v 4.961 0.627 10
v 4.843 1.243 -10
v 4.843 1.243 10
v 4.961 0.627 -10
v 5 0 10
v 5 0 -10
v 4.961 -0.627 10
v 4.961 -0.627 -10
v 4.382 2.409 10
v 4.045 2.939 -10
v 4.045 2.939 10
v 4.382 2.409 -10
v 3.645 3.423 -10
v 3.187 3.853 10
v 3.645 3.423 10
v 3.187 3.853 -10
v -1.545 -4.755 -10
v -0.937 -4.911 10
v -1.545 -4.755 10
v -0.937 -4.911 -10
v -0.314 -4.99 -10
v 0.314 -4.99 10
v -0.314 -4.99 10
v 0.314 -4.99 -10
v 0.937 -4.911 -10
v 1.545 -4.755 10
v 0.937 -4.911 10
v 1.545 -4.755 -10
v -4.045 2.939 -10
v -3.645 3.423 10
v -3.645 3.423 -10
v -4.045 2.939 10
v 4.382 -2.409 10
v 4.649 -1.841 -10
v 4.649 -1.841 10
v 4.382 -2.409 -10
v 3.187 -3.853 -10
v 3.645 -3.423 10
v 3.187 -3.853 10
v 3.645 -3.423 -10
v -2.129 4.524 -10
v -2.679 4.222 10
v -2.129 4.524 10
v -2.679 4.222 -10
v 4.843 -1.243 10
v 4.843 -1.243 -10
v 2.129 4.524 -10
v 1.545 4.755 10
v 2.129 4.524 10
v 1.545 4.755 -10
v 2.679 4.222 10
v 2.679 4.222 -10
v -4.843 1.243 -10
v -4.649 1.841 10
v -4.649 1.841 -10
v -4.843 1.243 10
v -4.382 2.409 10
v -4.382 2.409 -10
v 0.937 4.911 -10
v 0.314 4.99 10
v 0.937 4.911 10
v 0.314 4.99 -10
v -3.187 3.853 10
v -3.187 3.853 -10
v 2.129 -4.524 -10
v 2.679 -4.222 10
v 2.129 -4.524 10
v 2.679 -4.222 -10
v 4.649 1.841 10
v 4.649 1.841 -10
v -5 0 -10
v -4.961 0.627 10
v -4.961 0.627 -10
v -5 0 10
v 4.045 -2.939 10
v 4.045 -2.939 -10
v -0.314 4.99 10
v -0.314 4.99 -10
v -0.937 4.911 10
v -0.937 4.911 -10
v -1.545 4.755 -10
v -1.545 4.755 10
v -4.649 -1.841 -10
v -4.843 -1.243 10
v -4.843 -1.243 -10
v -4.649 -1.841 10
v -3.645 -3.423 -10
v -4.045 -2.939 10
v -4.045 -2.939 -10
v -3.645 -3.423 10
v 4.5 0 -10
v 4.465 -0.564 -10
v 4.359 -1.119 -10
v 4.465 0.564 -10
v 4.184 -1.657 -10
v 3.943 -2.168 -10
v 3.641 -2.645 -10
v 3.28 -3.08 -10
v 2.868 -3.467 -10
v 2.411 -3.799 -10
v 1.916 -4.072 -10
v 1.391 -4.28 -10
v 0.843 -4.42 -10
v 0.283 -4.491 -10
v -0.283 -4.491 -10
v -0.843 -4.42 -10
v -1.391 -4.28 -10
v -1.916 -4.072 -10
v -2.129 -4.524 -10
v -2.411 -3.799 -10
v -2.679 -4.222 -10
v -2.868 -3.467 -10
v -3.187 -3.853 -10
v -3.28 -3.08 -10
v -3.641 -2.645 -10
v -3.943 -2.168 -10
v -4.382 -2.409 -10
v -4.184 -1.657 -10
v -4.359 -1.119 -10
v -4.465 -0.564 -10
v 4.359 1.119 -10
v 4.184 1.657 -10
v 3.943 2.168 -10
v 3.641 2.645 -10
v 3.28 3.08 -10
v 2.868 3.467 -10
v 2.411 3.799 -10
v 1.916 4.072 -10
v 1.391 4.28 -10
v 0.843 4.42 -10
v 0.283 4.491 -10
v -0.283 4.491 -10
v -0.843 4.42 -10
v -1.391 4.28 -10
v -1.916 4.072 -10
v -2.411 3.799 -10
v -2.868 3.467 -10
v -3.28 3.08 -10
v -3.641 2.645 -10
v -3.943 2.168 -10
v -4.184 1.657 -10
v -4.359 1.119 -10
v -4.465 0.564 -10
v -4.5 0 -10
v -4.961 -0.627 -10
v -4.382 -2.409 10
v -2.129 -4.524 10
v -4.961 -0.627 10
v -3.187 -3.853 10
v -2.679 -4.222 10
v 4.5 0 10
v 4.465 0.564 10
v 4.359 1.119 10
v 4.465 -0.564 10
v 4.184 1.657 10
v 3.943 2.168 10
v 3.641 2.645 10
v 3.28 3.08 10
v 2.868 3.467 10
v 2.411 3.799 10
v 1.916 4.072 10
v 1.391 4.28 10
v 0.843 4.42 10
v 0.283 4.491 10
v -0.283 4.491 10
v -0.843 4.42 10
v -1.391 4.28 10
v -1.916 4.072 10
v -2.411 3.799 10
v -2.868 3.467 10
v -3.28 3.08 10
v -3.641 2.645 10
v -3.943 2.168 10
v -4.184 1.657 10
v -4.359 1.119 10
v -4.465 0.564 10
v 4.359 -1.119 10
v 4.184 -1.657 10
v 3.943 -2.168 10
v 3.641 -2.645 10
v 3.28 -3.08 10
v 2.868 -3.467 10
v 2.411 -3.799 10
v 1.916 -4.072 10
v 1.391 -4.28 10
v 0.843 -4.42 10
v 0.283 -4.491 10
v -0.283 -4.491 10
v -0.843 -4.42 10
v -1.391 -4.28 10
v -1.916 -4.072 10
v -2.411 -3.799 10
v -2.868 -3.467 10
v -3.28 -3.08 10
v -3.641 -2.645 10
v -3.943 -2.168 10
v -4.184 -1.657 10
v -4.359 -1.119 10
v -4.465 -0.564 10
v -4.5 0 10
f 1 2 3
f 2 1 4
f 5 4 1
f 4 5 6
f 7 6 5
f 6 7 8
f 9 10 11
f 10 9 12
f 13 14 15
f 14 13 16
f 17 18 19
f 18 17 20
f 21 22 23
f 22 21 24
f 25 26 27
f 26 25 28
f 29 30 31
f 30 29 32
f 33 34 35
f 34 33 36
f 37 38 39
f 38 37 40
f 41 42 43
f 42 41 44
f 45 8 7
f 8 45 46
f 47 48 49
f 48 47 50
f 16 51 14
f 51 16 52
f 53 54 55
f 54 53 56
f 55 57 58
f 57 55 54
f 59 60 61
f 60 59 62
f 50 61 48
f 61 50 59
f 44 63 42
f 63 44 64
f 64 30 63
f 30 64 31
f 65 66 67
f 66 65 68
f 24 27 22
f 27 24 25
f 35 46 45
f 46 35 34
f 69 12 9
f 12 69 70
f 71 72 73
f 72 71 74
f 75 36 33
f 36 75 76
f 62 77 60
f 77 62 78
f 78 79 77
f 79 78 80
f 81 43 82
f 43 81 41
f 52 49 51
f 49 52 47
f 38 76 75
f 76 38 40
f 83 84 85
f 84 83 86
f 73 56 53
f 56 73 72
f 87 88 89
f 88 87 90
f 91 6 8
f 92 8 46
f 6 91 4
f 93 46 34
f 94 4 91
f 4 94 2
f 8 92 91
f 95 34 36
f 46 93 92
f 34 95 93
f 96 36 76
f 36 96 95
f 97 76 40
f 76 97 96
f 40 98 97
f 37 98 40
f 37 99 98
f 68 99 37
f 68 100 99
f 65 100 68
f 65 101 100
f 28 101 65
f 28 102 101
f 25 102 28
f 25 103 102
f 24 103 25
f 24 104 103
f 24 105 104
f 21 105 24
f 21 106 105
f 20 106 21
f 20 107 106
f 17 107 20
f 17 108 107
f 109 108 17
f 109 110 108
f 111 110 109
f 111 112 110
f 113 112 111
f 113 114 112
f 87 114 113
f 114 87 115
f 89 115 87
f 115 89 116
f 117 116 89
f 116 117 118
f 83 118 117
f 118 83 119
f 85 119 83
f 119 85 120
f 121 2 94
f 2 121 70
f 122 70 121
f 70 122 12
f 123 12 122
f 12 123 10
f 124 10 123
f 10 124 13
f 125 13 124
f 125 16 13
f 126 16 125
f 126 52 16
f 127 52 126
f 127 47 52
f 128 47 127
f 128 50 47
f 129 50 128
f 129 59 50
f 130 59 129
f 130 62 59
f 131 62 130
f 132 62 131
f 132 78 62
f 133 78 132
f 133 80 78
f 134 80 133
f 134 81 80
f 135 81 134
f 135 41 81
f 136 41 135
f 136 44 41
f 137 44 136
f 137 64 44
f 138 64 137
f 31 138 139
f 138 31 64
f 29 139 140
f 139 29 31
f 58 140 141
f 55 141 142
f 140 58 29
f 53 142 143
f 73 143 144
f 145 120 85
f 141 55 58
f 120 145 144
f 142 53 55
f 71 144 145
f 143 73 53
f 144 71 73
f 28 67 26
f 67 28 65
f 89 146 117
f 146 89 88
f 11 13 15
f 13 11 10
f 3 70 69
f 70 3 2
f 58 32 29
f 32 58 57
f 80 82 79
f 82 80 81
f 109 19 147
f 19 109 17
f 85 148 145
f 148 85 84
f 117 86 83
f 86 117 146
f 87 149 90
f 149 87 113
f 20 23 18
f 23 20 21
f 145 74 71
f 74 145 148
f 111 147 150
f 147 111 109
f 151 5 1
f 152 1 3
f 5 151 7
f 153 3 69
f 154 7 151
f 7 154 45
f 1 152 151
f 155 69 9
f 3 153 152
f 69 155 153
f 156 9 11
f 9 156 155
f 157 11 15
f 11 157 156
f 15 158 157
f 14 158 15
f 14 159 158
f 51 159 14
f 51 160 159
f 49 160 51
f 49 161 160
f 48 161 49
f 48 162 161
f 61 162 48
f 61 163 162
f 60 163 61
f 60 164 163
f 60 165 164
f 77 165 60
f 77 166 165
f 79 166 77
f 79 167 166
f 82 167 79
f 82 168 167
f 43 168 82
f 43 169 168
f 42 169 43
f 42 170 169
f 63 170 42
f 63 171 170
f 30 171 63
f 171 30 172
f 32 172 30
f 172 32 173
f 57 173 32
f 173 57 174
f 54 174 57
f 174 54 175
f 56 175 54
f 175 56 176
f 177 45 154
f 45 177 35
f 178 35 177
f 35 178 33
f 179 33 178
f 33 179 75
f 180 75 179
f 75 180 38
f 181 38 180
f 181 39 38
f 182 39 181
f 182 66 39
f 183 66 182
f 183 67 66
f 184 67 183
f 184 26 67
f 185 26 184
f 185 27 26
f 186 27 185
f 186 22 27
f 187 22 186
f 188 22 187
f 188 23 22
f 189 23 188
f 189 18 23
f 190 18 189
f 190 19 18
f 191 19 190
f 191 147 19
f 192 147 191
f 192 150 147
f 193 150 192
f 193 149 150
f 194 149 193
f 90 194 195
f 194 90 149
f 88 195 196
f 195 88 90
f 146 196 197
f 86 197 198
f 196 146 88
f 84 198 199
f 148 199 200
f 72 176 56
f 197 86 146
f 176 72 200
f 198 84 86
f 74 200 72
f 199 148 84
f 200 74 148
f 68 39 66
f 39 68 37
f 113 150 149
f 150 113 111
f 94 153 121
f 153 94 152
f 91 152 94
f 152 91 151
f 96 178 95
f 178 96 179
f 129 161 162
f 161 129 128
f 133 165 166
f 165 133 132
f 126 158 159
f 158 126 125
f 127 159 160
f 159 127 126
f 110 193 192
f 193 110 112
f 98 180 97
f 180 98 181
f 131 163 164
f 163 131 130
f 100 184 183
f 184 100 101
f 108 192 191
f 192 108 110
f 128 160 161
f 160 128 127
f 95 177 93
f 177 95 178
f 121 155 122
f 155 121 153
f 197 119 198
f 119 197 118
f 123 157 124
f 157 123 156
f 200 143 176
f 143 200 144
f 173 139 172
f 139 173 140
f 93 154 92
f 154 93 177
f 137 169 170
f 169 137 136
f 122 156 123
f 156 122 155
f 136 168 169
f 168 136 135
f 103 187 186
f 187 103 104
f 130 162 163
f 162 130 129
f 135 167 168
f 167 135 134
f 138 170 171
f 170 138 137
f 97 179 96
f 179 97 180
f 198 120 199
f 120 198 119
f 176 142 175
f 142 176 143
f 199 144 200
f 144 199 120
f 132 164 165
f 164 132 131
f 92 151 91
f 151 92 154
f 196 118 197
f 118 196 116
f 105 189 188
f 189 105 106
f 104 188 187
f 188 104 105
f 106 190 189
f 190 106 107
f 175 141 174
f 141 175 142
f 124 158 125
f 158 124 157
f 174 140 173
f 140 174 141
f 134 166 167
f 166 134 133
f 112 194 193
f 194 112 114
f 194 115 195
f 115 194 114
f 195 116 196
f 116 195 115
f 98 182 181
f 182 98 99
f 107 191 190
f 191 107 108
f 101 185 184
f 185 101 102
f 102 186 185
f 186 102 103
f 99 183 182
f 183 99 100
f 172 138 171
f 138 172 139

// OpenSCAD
$fn = 50;


difference() {
	union() {
		translate(v = [0, 0, -10.0000000000]) {
			cylinder(h = 20, r = 5.0000000000);
		}
	}
	union() {
		translate(v = [0, 0, -100.0000000000]) {
			cylinder(h = 200, r = 4.5000000000);
		}
	}
}
